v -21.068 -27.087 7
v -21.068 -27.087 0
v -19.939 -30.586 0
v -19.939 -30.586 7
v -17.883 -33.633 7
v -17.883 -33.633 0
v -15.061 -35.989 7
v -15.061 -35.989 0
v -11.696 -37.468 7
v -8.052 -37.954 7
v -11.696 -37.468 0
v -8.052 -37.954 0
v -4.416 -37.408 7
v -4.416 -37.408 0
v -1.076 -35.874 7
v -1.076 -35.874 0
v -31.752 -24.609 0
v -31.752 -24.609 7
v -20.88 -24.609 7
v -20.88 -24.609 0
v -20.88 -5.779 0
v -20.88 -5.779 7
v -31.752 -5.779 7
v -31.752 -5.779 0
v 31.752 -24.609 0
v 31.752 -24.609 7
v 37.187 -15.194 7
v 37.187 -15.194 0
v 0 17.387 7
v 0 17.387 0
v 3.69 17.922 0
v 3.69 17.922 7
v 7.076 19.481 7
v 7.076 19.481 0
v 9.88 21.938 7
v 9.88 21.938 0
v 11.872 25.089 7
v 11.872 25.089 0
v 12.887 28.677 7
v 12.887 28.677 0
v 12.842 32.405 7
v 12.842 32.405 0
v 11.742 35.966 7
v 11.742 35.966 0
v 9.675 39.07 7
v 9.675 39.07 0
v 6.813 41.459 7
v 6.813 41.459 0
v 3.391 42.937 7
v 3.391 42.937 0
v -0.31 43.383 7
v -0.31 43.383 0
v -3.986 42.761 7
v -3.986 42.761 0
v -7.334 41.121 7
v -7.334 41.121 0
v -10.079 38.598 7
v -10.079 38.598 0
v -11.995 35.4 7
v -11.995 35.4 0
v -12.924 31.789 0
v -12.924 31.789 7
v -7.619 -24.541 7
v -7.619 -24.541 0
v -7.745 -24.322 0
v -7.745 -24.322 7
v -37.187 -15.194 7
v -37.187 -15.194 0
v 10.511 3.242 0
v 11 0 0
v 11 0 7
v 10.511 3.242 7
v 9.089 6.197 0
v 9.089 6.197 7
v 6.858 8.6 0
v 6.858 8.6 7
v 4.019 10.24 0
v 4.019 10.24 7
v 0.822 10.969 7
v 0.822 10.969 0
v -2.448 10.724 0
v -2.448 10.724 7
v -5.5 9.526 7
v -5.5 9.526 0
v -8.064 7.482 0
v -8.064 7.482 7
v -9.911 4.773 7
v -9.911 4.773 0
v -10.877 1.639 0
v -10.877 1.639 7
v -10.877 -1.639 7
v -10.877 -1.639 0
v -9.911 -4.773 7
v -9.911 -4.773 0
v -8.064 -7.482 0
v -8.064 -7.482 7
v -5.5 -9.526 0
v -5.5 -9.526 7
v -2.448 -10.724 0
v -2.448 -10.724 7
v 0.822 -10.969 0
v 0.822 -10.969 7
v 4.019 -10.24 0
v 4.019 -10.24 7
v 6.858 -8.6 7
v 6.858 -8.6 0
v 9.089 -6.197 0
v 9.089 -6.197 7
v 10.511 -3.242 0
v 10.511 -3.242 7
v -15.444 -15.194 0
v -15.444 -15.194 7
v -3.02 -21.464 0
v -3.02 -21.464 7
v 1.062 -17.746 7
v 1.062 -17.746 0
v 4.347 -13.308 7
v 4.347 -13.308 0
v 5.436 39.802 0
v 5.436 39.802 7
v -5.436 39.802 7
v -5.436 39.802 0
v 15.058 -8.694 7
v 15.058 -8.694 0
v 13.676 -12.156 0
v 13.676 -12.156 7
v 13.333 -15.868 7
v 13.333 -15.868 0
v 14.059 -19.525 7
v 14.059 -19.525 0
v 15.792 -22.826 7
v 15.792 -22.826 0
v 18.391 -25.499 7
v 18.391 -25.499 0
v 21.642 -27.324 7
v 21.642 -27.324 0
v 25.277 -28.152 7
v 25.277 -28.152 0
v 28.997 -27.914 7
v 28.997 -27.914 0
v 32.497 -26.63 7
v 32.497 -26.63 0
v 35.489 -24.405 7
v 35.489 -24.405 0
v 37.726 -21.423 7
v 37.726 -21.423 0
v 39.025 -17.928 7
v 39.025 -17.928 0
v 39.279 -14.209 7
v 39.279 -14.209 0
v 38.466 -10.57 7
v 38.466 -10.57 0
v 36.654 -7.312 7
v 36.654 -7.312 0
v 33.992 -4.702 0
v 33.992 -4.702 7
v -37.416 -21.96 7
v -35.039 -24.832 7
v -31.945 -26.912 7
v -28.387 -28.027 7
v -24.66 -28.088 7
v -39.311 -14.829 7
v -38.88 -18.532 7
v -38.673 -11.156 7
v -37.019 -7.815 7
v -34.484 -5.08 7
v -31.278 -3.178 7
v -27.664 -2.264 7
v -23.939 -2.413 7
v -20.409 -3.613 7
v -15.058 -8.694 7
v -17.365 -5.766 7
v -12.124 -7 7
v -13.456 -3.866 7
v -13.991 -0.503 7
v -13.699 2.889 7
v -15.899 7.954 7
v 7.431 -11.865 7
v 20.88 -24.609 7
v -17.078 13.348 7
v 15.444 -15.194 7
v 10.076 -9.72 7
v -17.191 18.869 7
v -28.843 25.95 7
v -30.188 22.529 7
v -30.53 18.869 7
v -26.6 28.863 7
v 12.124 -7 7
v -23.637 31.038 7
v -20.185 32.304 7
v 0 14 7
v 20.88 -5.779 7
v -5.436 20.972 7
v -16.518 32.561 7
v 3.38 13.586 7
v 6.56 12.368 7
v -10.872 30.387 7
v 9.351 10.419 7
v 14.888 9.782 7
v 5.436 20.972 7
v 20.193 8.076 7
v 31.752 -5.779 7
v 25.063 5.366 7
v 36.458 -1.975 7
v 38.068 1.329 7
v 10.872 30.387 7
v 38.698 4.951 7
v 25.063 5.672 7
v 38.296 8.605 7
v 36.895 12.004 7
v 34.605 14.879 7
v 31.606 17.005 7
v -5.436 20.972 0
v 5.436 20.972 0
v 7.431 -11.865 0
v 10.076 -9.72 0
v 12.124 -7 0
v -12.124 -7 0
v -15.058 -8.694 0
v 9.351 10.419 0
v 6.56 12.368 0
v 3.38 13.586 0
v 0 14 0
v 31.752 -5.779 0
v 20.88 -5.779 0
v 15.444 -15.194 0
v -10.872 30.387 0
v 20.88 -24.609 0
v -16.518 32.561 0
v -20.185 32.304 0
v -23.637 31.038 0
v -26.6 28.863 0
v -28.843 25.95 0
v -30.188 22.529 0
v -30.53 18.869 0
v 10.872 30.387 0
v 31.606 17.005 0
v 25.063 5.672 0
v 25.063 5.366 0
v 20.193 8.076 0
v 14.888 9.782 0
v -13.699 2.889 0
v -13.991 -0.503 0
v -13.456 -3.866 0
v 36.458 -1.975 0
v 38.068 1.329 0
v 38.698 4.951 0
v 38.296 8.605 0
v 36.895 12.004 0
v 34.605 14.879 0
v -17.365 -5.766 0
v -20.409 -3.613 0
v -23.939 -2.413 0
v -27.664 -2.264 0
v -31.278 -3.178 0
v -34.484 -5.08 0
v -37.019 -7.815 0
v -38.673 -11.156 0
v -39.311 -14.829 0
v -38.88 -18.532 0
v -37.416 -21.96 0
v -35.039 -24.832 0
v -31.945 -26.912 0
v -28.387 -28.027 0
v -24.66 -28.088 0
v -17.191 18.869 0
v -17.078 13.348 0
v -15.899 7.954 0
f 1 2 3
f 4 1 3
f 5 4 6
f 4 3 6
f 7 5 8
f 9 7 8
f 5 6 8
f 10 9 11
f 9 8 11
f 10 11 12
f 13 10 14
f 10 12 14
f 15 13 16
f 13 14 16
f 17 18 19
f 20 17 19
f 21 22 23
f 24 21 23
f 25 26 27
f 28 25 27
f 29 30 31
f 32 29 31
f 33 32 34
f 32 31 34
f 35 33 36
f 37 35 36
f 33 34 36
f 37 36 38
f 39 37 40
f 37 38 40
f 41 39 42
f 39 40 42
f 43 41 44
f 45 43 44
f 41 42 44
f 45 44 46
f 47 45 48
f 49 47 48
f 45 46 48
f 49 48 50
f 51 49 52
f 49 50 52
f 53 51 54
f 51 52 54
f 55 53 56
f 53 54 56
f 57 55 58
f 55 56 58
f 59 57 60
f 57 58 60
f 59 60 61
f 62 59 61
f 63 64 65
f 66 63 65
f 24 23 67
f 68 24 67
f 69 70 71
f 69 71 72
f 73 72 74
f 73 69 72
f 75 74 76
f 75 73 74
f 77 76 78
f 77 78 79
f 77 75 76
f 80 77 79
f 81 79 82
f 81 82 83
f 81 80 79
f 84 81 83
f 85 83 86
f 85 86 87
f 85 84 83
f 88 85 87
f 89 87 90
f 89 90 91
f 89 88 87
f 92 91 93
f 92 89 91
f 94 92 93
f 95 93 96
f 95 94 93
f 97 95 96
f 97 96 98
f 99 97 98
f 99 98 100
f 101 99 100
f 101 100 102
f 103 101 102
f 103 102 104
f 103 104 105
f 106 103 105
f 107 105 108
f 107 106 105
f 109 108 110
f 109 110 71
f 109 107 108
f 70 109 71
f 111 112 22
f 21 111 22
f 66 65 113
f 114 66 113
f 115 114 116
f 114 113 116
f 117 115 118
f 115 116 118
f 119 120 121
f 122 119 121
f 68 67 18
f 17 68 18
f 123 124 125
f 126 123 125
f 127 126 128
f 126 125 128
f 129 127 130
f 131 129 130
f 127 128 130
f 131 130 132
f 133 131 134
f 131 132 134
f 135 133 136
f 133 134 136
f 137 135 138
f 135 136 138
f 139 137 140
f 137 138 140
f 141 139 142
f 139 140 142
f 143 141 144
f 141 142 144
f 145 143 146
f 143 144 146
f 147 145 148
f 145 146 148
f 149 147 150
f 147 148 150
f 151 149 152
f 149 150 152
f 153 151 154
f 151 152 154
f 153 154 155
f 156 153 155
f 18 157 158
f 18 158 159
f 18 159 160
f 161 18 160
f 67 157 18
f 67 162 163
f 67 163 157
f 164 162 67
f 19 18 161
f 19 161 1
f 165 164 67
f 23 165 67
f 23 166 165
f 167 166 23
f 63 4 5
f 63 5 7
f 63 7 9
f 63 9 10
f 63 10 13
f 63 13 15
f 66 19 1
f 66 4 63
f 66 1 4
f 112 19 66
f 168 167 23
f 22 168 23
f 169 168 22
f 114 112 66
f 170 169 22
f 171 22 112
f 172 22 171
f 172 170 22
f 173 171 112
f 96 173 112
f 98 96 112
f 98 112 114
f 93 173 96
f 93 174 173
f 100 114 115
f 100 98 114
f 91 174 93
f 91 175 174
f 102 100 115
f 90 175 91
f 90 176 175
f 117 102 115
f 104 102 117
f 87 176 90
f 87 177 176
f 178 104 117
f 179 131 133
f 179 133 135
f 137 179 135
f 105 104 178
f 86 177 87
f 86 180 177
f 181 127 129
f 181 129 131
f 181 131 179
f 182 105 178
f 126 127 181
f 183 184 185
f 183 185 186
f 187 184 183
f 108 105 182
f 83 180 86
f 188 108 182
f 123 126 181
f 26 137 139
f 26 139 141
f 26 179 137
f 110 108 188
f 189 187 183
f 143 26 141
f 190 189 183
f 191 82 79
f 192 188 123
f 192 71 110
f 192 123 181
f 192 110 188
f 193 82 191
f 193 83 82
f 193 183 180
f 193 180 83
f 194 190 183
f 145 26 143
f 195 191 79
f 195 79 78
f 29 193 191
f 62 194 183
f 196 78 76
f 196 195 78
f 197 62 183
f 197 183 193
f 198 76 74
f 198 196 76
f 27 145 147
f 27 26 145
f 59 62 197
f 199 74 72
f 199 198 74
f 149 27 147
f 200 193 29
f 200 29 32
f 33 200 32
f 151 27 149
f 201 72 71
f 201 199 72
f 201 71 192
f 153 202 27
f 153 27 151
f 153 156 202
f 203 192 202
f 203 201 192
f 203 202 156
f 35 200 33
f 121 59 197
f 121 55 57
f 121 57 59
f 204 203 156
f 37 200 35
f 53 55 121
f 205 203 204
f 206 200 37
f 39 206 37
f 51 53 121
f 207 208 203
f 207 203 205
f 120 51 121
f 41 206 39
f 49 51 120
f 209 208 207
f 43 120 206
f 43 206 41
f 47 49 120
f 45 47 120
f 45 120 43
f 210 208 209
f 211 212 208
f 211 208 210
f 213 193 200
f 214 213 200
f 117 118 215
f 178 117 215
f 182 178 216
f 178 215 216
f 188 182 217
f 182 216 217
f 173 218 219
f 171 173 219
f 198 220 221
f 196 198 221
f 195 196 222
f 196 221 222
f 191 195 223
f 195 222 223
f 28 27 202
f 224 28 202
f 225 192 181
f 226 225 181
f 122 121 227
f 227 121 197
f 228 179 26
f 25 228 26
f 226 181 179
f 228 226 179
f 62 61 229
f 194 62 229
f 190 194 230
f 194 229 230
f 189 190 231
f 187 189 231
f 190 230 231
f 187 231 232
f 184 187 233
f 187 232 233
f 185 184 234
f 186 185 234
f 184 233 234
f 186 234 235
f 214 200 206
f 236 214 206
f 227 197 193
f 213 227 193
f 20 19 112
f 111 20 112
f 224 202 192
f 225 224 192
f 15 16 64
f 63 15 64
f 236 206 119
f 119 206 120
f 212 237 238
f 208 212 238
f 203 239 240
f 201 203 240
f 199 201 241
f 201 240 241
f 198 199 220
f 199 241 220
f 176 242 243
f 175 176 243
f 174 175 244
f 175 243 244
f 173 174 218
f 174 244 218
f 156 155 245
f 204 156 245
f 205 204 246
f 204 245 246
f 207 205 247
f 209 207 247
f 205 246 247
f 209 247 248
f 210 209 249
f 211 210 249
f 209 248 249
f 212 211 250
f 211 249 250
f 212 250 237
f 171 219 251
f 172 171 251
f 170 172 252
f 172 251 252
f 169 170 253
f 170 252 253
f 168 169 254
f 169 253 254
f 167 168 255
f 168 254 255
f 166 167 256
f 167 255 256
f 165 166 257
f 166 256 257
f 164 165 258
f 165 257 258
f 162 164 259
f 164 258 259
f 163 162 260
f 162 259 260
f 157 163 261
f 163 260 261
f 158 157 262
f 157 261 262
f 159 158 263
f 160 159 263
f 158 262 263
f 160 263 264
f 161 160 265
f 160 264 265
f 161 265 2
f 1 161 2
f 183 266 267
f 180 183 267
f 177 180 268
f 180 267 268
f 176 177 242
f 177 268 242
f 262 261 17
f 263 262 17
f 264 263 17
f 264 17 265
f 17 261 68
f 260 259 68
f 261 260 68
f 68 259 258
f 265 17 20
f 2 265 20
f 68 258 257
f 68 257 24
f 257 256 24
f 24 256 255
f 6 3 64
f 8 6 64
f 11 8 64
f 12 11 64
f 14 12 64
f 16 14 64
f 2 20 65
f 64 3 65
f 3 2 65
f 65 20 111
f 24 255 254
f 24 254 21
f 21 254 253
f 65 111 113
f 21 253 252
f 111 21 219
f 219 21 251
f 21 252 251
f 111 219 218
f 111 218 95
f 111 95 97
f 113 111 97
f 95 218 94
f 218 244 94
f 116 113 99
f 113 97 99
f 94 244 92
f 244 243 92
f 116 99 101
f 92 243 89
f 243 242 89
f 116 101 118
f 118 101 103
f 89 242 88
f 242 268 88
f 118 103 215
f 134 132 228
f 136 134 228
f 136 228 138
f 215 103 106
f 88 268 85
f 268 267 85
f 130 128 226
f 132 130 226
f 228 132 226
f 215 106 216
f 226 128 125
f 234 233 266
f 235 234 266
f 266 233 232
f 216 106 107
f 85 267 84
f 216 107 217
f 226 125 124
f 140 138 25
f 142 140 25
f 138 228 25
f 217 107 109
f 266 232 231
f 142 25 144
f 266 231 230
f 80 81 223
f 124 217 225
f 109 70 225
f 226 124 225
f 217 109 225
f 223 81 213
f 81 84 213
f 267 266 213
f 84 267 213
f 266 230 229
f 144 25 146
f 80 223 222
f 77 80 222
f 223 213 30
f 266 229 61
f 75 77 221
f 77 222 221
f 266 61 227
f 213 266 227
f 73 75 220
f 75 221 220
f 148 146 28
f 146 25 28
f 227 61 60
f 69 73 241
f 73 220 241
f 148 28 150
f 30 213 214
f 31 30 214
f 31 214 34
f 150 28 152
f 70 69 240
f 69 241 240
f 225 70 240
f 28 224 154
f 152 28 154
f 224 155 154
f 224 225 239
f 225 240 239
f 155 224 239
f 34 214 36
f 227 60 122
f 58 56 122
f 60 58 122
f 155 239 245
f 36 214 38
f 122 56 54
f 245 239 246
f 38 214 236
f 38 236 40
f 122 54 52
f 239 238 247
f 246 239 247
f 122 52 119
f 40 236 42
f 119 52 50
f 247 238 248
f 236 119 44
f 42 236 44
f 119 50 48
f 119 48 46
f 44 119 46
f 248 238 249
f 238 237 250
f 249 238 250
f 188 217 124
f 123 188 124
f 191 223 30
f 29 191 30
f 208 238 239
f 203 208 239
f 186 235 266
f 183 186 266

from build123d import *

# Parameters (mm, degrees)
F0_R     = 11
F1_DEPTH = 7
F3_DEPTH = 25


with BuildPart() as f1:
    # F0 (on Top) → F1 (new body)
    with BuildSketch(Plane.XY):
        with BuildLine():
            ThreePointArc((-7.74528, -24.322292), (-0.888747, -19.704747), (4.347186, -13.307967))
            ThreePointArc((4.347186, -13.307967), (8.819044, -10.873108), (12.124356, -7))
            Line((12.124356, -7), (15.057621, -8.693521))
            ThreePointArc((15.057621, -8.693521), (28.99745, -27.91396), (33.992432, -4.702018))
            ThreePointArc((33.992432, -4.702018), (38.625506, 6.792291), (31.605888, 17.005492))
            Line((31.605888, 17.005492), (25.062695, 5.67235))
            Line((25.062695, 5.67235), (25.062695, 5.366495))
            ThreePointArc((25.062695, 5.366495), (17.582241, 9.059312), (9.351444, 10.418756))
            ThreePointArc((9.351444, 10.418756), (5.006866, 13.07407), (0, 14))
            Line((0, 14), (0, 17.387043))
            ThreePointArc((0, 17.387043), (9.675474, 39.069509), (-12.924149, 31.789318))
            ThreePointArc((-12.924149, 31.789318), (-25.19505, 30.054524), (-30.530132, 18.868756))
            Line((-30.530132, 18.868756), (-17.443746, 18.868756))
            Line((-17.443746, 18.868756), (-17.191083, 18.868756))
            ThreePointArc((-17.191083, 18.868756), (-16.620438, 10.62205), (-13.69863, 2.88921))
            ThreePointArc((-13.69863, 2.88921), (-13.825909, -2.200962), (-12.124356, -7))
            Line((-12.124356, -7), (-15.057621, -8.693521))
            ThreePointArc((-15.057621, -8.693521), (-38.672924, -11.155548), (-21.068283, -27.0873))
            ThreePointArc((-21.068283, -27.0873), (-13.430456, -36.846815), (-1.075755, -35.874248))
            Line((-1.075755, -35.874248), (-7.618949, -24.541105))
            Line((-7.618949, -24.541105), (-7.74528, -24.322292))
        make_face()
        Circle(F0_R, mode=Mode.SUBTRACT)
    extrude(amount=F1_DEPTH)

    # F2 (on face) → F3 (cut)
    with BuildSketch(Plane.XY.offset(7)):
        Polygon((5.435753, 39.802043), (-5.435753, 39.802043), (-10.871506, 30.387043), (-5.435753, 20.972043), (5.435753, 20.972043), (10.871506, 30.387043), align=None)
        Polygon((-37.187457, -15.193521), (-31.751704, -24.608521), (-20.880198, -24.608521), (-15.444446, -15.193521), (-20.880198, -5.778521), (-31.751704, -5.778521), align=None)
        Polygon((31.751704, -24.608521), (37.187457, -15.193521), (31.751704, -5.778521), (20.880198, -5.778521), (15.444446, -15.193521), (20.880198, -24.608521), align=None)
    extrude(amount=-F3_DEPTH, mode=Mode.SUBTRACT)


solid = f1.part
